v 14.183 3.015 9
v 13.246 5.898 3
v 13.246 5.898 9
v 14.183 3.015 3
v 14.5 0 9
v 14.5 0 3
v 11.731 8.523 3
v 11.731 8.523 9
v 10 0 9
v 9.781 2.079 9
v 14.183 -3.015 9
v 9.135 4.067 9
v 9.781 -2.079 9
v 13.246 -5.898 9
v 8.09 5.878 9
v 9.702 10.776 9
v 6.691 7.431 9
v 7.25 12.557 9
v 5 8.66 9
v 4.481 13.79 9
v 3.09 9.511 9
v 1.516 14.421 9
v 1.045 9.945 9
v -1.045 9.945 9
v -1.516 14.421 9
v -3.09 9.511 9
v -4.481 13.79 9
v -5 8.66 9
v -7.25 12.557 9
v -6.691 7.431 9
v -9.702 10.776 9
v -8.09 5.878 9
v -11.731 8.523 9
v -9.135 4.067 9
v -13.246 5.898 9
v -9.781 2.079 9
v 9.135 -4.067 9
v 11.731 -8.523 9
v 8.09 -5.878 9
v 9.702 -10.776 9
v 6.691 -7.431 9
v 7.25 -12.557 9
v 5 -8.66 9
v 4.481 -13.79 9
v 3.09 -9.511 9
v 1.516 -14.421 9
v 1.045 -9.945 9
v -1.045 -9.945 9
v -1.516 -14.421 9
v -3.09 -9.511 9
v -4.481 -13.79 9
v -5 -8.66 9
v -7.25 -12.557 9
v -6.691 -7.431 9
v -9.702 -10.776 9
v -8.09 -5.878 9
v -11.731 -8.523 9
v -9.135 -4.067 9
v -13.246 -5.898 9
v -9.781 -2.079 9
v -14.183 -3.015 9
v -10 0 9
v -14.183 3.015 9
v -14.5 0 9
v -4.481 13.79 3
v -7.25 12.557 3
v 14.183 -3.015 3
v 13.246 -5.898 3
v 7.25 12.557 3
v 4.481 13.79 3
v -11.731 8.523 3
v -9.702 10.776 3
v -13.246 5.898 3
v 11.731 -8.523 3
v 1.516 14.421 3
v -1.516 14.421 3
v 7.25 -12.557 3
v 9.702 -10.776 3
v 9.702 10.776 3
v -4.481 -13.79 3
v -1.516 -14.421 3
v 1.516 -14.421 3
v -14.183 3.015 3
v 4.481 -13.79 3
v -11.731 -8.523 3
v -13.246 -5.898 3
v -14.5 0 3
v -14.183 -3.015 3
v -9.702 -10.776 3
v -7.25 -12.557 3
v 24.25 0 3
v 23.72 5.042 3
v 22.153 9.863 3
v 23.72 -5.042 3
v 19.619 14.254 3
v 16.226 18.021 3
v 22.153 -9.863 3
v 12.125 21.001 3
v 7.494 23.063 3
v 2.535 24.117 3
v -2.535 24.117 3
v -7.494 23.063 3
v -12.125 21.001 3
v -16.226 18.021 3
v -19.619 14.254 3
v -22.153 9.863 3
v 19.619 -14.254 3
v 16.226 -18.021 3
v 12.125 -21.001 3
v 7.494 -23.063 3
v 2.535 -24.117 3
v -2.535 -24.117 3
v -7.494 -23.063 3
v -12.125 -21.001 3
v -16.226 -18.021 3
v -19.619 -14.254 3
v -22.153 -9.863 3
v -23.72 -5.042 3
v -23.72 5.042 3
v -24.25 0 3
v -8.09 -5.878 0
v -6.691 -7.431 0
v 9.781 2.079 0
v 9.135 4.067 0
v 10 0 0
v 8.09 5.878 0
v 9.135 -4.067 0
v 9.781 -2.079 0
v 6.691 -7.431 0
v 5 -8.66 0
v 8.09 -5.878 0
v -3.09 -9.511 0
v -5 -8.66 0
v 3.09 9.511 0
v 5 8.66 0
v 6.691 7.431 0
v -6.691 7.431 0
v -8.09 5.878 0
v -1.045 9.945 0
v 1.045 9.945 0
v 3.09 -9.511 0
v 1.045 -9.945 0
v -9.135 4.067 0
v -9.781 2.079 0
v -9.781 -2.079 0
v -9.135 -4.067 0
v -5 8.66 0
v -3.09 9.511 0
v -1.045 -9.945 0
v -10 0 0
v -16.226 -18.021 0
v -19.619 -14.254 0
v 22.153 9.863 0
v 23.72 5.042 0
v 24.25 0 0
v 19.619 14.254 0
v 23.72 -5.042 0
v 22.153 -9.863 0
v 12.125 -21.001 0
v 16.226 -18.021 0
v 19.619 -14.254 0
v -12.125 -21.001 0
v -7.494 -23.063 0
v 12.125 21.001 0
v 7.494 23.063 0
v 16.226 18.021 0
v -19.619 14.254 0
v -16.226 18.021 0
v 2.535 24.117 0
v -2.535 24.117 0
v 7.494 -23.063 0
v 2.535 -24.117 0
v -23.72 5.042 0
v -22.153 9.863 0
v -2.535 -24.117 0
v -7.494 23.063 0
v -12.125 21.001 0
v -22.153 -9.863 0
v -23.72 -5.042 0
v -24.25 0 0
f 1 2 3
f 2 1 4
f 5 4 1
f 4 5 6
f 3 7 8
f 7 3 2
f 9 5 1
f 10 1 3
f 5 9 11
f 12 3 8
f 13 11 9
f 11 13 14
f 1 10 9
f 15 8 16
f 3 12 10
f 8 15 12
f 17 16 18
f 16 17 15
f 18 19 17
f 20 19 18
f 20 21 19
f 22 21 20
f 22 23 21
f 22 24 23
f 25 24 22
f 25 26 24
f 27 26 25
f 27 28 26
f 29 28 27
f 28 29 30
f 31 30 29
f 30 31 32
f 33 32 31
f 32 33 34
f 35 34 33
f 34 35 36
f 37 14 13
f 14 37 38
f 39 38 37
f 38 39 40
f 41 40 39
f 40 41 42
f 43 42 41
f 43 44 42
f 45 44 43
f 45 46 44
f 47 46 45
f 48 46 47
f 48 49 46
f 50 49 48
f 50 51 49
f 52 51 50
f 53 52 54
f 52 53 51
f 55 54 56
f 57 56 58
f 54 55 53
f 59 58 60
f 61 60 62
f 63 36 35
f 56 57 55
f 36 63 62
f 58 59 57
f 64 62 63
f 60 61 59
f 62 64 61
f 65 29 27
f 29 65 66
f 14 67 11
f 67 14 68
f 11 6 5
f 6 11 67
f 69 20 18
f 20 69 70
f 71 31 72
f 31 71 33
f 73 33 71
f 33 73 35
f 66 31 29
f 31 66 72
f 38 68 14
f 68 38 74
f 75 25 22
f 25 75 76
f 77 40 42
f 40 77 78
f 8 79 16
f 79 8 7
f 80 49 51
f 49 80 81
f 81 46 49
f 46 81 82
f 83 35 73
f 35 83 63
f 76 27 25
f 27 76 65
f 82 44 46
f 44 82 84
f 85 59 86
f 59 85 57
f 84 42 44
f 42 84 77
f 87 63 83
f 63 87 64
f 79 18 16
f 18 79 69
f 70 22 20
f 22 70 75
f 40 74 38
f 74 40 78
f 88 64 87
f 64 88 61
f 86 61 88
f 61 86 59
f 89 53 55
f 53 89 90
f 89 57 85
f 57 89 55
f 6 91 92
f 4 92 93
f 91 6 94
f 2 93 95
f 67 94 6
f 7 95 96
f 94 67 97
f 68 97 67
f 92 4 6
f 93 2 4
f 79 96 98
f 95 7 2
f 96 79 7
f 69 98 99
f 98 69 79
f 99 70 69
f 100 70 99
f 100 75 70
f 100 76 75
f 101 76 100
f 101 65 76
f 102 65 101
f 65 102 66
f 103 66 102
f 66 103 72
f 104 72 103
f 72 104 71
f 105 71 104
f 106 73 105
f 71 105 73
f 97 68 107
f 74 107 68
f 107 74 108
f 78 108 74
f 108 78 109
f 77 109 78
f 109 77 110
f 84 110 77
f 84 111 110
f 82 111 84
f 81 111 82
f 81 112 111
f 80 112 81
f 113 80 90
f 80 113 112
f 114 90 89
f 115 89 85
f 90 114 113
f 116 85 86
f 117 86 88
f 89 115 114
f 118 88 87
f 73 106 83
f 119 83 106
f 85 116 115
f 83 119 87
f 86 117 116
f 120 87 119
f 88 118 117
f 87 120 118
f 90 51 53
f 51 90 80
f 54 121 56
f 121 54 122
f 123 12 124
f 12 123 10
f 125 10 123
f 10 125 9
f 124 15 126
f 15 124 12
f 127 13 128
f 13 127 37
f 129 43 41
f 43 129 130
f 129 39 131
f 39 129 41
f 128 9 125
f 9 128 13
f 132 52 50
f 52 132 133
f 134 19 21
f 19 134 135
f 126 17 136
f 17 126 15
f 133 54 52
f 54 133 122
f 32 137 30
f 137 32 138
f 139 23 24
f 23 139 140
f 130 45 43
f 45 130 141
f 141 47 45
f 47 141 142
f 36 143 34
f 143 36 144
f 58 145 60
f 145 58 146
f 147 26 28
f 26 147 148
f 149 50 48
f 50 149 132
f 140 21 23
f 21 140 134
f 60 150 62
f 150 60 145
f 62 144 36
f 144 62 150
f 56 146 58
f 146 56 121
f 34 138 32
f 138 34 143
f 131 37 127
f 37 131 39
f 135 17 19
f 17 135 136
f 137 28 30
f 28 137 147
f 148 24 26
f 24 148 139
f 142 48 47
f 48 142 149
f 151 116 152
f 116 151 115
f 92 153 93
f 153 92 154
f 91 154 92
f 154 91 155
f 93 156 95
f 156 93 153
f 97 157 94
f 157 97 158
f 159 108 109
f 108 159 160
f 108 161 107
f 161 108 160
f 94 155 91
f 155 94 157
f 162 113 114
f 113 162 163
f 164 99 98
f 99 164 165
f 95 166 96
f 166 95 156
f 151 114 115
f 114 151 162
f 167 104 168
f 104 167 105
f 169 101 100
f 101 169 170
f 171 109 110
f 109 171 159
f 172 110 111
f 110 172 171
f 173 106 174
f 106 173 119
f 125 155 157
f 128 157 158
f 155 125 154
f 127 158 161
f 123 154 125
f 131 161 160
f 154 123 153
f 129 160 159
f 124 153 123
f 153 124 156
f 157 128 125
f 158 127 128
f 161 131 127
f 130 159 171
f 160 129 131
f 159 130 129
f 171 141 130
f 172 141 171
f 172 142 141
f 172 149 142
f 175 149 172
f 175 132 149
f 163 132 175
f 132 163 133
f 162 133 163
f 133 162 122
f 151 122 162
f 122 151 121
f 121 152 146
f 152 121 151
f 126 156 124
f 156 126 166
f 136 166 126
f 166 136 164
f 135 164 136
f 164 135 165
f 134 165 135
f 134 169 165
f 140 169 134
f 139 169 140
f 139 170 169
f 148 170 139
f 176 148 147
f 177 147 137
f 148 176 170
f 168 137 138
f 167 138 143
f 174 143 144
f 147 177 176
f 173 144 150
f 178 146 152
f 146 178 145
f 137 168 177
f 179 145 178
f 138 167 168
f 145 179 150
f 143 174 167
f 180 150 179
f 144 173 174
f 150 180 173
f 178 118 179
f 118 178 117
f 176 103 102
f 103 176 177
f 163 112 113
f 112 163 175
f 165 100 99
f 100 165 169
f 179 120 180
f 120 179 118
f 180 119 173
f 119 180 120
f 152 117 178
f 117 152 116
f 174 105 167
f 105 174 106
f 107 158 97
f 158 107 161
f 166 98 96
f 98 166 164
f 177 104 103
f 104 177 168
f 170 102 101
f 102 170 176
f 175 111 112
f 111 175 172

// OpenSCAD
translate([0,0,3]) {
    // Your ring code here
    difference() {
        cylinder(h=6, d=29);
        cylinder(h=6, d=20);
    }
}




translate([0,0,0]) {
    // Your ring code here
    difference() {
        cylinder(h=3, d=48.5);
        cylinder(h=3, d=20);
    }
}
